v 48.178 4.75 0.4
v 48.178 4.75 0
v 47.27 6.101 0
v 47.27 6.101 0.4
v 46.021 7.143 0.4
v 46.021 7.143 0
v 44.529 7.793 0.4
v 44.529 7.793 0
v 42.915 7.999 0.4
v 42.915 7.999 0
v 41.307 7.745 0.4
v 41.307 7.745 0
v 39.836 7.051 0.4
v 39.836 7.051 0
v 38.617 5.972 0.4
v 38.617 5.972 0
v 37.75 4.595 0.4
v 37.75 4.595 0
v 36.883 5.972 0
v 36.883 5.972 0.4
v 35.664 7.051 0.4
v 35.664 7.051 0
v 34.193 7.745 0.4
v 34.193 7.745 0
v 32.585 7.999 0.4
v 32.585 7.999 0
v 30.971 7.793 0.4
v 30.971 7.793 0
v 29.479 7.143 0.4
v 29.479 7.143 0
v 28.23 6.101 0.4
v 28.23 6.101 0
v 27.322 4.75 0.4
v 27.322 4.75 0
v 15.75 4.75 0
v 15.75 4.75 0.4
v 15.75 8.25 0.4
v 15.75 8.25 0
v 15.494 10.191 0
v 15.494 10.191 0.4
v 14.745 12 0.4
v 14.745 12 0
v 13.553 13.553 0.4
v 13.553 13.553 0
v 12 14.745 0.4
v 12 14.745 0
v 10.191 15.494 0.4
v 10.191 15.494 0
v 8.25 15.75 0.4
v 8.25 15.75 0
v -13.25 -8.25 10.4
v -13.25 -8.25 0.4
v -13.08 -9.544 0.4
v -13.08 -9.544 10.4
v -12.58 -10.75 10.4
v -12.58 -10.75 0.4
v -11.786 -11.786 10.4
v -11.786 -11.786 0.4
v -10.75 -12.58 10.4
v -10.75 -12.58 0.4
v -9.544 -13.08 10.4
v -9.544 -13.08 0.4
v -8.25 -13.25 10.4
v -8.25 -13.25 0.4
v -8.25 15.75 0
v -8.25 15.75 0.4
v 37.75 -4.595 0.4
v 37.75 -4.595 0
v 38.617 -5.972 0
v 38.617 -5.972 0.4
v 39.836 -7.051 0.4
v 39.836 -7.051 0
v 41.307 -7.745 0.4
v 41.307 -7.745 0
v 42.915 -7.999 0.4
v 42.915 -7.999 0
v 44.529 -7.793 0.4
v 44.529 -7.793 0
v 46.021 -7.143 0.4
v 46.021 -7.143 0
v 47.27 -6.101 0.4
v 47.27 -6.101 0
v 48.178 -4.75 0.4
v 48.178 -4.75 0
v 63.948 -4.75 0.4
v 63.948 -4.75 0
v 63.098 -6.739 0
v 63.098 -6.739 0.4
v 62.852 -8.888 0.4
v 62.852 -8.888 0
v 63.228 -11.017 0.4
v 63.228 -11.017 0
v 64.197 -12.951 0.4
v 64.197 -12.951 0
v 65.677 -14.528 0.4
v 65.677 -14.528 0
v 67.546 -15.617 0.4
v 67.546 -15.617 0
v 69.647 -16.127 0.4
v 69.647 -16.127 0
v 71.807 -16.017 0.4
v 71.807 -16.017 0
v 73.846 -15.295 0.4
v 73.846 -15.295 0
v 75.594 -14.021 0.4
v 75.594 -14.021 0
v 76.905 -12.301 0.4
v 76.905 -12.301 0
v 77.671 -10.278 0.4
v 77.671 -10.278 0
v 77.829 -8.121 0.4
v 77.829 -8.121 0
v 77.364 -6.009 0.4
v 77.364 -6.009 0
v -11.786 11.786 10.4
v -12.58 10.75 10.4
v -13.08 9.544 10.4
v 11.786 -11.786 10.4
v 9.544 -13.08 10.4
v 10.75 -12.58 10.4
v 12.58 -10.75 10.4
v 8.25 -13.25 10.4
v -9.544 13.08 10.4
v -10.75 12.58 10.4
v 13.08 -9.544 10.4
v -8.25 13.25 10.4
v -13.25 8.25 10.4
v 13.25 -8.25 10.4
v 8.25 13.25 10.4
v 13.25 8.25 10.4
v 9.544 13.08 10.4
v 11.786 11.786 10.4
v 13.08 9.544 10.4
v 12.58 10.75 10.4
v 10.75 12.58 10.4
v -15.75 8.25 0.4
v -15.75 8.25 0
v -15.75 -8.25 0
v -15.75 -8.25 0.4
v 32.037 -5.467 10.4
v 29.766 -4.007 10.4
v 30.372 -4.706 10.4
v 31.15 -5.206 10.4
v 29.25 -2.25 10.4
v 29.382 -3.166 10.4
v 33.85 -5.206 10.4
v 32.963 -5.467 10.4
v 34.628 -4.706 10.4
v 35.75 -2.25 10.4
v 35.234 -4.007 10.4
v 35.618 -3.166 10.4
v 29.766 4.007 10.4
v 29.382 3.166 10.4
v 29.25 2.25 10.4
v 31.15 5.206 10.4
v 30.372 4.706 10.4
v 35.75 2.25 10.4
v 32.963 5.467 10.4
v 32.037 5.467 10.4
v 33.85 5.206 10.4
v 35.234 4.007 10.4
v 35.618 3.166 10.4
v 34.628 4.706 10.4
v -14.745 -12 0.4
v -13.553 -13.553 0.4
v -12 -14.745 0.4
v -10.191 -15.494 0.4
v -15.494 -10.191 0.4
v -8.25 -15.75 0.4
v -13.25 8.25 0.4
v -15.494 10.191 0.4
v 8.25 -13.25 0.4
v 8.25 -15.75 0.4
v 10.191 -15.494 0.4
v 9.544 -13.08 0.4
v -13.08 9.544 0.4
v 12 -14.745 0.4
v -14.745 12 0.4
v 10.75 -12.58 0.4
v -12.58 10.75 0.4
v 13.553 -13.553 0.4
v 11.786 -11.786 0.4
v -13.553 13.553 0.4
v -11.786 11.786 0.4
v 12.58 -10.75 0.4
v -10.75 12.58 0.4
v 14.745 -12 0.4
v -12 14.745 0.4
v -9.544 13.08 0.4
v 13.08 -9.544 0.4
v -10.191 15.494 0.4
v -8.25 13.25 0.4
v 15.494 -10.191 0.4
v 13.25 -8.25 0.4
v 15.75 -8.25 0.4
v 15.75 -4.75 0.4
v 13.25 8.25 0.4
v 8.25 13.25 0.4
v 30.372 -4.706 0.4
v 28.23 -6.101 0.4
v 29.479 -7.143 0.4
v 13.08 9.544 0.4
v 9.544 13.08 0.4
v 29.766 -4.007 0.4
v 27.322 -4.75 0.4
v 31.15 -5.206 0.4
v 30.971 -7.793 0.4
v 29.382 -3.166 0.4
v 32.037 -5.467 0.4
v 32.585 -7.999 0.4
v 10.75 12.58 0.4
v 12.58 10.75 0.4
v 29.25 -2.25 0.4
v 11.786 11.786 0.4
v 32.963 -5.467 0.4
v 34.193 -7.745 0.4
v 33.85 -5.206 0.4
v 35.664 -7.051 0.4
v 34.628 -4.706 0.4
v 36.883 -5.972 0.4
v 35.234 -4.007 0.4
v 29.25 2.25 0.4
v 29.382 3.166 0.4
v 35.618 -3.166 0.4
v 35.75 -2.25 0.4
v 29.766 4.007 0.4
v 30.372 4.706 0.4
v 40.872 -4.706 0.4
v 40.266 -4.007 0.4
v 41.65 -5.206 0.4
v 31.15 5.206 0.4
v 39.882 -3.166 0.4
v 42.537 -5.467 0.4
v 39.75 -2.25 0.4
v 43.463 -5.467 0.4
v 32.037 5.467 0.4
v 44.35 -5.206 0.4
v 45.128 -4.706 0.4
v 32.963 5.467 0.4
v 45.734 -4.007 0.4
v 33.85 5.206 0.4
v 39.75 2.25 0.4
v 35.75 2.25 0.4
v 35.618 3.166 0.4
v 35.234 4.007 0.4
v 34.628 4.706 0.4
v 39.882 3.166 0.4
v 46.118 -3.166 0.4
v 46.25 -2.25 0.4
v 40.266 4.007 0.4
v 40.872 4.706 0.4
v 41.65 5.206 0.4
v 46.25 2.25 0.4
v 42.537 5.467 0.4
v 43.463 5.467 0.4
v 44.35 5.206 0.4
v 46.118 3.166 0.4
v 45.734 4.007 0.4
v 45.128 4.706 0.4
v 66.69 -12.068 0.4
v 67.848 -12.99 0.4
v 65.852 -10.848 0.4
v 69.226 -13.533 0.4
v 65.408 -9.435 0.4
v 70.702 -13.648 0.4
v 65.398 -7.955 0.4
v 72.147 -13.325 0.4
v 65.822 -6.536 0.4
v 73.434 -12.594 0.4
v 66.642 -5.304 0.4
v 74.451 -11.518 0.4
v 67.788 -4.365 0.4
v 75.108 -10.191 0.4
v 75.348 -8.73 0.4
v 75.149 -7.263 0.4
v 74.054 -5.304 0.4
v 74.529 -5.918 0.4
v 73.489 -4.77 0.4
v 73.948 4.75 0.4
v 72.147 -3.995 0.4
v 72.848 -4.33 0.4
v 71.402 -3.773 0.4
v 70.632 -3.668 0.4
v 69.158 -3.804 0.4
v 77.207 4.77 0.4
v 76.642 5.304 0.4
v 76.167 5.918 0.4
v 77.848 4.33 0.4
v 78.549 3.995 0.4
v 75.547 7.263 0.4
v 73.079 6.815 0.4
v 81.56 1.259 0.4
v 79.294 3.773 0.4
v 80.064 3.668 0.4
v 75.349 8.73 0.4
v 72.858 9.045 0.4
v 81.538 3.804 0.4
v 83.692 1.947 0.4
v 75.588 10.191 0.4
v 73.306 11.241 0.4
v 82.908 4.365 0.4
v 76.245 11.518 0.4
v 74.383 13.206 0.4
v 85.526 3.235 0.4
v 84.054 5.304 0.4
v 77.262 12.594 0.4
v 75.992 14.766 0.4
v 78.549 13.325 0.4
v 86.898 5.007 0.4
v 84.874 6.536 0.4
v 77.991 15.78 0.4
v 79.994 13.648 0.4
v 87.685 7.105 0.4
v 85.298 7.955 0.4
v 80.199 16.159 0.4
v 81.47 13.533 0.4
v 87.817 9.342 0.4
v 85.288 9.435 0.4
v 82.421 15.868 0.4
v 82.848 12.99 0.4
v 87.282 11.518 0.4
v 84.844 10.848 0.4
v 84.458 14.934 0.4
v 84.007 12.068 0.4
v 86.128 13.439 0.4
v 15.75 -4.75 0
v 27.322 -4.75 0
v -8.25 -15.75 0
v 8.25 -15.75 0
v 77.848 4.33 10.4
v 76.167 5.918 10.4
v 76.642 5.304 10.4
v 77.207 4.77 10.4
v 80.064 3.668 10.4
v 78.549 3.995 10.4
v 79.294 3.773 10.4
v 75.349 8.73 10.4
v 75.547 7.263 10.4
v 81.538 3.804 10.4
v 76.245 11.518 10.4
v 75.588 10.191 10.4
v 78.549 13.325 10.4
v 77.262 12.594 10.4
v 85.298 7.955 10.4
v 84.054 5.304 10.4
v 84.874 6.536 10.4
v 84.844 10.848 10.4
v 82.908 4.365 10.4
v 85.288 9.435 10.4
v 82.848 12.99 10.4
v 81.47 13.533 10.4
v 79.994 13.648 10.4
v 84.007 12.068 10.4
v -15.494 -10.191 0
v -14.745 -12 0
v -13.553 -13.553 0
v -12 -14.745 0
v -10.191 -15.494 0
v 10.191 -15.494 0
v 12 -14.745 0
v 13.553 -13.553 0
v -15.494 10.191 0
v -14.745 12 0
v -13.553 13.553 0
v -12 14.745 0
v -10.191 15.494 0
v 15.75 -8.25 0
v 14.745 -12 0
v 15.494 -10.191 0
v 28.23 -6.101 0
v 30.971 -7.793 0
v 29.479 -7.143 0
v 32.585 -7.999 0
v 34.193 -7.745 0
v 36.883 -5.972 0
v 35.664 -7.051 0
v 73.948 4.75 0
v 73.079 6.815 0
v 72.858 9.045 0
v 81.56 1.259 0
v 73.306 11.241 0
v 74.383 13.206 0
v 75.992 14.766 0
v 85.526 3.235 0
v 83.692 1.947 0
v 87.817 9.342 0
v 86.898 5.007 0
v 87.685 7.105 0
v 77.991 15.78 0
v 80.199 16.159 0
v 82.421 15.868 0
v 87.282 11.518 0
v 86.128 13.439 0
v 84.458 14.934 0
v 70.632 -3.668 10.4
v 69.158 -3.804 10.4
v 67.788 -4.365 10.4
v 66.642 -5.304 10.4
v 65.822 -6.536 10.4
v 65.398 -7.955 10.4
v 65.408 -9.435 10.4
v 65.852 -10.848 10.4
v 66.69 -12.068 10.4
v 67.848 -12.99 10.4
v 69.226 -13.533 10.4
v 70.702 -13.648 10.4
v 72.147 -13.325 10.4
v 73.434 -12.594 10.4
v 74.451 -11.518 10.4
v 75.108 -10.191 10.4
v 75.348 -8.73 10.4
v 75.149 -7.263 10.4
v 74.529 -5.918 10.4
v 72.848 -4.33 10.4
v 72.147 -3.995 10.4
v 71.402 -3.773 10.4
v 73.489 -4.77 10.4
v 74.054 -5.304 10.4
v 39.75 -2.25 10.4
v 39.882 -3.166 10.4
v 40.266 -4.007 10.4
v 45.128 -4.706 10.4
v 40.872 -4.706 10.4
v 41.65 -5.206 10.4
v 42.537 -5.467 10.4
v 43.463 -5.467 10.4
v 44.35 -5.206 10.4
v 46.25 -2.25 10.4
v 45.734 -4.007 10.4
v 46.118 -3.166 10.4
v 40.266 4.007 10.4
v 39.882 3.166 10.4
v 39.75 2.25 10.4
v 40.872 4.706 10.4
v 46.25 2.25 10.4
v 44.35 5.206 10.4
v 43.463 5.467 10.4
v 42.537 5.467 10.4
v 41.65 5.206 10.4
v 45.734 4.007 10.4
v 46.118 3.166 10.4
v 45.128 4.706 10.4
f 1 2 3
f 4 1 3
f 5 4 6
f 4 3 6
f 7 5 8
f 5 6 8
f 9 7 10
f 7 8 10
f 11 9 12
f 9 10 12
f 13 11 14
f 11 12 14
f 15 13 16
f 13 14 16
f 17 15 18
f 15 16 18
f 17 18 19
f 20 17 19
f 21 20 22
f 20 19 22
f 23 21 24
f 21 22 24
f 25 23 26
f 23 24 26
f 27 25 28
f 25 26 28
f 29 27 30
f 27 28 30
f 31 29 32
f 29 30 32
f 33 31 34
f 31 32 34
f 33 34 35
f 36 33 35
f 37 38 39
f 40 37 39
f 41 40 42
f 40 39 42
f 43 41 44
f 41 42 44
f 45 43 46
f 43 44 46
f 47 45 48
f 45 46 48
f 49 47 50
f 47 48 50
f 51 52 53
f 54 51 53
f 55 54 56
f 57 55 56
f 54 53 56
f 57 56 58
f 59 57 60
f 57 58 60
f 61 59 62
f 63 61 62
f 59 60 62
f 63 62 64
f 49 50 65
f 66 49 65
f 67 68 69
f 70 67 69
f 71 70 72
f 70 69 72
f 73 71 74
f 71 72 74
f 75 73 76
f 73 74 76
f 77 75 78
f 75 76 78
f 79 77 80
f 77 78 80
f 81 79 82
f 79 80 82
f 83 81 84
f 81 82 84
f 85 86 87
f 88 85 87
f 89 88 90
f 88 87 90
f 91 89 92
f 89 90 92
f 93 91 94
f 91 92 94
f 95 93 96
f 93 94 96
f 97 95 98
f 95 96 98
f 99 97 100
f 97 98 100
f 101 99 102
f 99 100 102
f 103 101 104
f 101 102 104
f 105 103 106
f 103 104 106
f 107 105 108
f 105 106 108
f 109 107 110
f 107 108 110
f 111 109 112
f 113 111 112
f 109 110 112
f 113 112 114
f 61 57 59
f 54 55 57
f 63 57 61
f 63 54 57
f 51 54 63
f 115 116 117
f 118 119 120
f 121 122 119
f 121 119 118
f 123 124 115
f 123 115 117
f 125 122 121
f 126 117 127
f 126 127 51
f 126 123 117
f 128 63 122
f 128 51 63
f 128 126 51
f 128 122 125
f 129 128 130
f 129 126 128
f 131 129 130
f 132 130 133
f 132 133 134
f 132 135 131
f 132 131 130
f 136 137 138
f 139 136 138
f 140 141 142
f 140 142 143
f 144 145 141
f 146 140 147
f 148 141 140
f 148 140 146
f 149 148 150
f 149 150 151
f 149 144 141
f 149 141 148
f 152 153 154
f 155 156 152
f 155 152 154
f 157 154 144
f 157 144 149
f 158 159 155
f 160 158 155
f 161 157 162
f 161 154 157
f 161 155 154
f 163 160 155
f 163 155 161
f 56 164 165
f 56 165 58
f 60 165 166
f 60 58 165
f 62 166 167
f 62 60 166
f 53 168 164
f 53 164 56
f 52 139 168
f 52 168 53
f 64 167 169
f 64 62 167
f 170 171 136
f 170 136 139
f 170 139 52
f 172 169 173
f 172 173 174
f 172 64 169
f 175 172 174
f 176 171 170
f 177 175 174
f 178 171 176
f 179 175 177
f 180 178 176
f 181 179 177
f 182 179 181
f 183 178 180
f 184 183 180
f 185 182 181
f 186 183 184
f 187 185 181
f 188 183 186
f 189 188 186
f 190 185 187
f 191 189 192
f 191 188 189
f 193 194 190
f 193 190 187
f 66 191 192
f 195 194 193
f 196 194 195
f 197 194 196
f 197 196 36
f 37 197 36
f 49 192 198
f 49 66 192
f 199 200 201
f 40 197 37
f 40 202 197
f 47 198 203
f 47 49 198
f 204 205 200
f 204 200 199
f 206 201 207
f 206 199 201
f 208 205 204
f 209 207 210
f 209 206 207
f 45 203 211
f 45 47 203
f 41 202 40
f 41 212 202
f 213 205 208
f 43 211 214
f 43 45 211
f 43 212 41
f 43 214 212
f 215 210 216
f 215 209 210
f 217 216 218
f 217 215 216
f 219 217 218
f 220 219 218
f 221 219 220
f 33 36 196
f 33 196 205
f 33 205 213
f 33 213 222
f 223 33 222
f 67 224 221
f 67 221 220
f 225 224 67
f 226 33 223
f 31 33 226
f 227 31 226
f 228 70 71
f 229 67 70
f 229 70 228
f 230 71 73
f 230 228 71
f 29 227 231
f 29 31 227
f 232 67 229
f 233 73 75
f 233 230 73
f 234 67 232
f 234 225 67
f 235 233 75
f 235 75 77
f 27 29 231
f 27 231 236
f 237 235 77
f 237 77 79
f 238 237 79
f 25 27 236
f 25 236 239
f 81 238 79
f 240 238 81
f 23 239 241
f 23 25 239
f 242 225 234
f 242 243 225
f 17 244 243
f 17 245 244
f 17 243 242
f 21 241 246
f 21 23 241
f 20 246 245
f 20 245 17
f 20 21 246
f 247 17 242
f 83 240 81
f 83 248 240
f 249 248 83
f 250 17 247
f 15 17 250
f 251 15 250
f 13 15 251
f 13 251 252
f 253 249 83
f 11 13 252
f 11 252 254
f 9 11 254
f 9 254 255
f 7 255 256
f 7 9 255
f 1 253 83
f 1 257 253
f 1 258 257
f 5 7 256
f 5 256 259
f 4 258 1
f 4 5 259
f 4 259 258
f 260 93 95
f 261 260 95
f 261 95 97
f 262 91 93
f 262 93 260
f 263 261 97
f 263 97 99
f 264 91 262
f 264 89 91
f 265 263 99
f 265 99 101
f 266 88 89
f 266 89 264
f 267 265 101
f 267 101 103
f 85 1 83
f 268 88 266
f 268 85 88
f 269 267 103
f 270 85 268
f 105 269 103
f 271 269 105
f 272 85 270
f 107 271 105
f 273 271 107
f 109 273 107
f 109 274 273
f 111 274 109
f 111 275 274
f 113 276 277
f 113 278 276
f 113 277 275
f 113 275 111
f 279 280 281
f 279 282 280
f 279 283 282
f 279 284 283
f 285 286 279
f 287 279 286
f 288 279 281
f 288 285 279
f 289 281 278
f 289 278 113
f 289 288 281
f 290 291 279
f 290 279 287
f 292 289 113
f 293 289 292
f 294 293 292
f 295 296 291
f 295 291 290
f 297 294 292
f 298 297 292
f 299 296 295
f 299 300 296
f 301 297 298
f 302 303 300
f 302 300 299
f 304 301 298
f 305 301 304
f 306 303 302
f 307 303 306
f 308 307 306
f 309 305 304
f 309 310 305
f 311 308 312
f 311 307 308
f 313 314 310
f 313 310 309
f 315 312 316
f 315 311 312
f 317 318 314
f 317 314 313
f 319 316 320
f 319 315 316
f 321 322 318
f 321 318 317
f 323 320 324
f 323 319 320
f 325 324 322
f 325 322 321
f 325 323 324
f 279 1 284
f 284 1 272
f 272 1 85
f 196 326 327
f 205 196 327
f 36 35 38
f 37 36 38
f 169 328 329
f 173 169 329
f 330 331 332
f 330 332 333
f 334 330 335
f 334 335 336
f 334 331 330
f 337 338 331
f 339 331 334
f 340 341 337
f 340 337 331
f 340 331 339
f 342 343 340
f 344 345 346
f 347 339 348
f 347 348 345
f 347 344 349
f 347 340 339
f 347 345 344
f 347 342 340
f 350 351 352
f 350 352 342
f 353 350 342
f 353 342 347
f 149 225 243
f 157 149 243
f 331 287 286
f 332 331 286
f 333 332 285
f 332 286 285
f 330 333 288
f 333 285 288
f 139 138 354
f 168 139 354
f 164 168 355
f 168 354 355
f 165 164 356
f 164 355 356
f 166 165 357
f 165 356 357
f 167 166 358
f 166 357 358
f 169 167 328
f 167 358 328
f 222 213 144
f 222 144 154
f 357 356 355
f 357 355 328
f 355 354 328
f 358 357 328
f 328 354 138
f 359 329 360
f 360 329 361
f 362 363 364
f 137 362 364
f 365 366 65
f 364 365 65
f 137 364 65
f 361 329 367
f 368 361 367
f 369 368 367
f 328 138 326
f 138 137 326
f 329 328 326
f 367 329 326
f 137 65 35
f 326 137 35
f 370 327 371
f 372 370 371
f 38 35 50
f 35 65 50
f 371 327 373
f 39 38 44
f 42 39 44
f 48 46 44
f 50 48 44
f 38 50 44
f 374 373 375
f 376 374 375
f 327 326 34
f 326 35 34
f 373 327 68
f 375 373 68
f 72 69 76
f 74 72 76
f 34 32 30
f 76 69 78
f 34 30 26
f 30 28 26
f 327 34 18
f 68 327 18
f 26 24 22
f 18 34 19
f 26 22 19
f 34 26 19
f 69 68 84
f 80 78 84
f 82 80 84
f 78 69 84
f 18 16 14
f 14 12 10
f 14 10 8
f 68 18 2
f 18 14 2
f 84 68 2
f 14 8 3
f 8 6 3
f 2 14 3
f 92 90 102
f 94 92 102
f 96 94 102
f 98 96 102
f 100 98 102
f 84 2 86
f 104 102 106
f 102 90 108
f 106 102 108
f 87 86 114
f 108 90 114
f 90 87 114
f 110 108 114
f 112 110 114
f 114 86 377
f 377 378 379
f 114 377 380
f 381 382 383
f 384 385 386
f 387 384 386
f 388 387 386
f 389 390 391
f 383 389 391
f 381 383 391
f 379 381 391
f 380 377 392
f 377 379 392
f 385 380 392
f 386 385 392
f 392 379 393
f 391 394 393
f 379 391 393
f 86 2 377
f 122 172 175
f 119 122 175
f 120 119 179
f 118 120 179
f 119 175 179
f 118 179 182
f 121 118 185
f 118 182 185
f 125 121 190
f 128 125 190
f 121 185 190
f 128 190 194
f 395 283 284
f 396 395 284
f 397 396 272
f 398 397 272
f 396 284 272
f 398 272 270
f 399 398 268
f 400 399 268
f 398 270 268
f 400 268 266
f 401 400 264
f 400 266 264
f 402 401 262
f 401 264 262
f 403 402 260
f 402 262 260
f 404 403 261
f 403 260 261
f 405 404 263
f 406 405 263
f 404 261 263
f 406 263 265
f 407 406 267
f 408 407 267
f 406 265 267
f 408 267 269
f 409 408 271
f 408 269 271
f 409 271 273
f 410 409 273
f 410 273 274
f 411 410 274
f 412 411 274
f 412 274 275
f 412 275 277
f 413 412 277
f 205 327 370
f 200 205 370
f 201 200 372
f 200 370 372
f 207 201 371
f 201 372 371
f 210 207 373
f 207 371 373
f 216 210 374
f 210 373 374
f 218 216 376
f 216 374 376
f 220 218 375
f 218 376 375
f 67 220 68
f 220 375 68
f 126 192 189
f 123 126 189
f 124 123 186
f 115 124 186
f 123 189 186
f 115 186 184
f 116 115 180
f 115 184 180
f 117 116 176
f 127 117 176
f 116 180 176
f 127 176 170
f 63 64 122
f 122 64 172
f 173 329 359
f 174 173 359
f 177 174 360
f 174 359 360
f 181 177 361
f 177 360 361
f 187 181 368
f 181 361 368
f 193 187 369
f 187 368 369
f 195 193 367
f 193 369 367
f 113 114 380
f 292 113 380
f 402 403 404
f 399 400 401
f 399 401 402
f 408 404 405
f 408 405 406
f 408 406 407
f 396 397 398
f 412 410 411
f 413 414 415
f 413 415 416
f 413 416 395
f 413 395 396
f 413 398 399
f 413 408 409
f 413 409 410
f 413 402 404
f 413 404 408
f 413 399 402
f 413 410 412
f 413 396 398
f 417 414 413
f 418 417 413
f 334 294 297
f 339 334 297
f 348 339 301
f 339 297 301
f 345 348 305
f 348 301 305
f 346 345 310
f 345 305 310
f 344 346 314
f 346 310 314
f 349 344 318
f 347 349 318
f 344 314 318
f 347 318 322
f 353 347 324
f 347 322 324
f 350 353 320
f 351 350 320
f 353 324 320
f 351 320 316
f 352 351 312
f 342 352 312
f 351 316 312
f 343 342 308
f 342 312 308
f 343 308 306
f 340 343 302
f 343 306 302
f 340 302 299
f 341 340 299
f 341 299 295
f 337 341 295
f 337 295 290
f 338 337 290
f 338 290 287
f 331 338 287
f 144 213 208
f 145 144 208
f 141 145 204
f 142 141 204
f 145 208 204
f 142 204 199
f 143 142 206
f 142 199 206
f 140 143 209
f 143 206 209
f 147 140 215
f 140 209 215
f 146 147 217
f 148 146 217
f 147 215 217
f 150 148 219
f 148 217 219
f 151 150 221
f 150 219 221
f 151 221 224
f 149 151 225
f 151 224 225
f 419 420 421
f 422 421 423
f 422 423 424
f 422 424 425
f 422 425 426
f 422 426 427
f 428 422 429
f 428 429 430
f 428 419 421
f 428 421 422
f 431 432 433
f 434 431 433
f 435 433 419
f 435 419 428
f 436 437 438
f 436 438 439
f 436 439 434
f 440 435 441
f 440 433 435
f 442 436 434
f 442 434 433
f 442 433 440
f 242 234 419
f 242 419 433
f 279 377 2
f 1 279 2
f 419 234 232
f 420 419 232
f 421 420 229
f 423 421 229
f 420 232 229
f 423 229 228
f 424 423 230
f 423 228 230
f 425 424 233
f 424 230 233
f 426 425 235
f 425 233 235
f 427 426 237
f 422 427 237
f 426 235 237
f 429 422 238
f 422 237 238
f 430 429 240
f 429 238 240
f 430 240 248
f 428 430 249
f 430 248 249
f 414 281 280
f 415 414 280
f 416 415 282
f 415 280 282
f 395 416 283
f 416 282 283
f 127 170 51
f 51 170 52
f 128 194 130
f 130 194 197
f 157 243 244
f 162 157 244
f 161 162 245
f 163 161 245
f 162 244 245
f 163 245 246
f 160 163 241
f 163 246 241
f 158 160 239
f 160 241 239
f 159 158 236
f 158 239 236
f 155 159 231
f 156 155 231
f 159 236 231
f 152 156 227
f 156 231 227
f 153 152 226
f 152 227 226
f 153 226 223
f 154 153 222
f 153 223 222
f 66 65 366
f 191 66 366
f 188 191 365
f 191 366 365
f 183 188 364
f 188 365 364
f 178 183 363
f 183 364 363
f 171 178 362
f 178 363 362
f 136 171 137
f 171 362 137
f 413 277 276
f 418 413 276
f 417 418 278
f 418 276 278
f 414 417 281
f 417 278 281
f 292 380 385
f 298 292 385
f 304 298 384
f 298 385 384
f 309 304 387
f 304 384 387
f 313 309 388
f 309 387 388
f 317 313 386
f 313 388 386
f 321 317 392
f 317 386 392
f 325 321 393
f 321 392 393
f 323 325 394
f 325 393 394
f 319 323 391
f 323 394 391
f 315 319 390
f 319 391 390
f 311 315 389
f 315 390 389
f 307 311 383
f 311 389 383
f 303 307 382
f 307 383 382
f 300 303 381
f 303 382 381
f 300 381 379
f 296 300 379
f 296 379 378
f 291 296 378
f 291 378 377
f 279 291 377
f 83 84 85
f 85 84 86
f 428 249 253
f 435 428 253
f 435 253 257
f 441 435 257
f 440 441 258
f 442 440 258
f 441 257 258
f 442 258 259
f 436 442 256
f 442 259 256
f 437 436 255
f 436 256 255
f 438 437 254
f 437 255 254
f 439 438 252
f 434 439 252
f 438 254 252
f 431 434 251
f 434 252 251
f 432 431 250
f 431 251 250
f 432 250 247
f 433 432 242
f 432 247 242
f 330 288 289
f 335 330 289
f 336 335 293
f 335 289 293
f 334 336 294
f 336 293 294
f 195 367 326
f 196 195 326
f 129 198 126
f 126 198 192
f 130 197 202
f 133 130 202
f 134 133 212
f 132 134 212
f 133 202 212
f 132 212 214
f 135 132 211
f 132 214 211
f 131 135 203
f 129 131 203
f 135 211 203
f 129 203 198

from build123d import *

# Parameters (mm, degrees)
F0_W     = 4
F0_H     = 4.5
F0_W_2   = 16
F0_W_3   = 6.5
F1_DEPTH = 0.4
F2_W     = 6.5
F2_H     = 4.5
F3_DEPTH = 10


with BuildPart() as f1:
    # F0 (on Top) → F1 (new body)
    with BuildSketch(Plane.XY):
        with BuildLine():
            Line((15.75, 4.75), (15.75, 8.25))
            ThreePointArc((15.75, 8.25), (13.5533008589, 13.5533008589), (8.25, 15.75))
            Line((8.25, 15.75), (-8.25, 15.75))
            ThreePointArc((-8.25, 15.75), (-13.5533008589, 13.5533008589), (-15.75, 8.25))
            Line((-15.75, 8.25), (-15.75, -8.25))
            ThreePointArc((-15.75, -8.25), (-13.5533008589, -13.5533008589), (-8.25, -15.75))
            Line((-8.25, -15.75), (8.25, -15.75))
            ThreePointArc((8.25, -15.75), (13.5533008589, -13.5533008589), (15.75, -8.25))
            Line((15.75, -8.25), (15.75, -4.75))
            Line((15.75, -4.75), (27.3219212057, -4.75))
            ThreePointArc((27.3219212057, -4.75), (32.5853423404, -7.9993666334), (37.75, -4.5952078799))
            ThreePointArc((37.75, -4.5952078799), (42.9146576596, -7.9993666334), (48.1780787943, -4.75))
            Line((48.1780787943, -4.75), (63.9480829801, -4.75))
            ThreePointArc((63.9480829801, -4.75), (69.6474451199, -16.1274567319), (77.3637435709, -6.0087617221))
            Line((77.3637435709, -6.0087617221), (81.5596501878, 1.2587617221))
            ThreePointArc((81.5596501878, 1.2587617221), (83.4749132345, 15.4773568118), (73.9480829801, 4.75))
            Line((73.9480829801, 4.75), (48.1780787943, 4.75))
            ThreePointArc((48.1780787943, 4.75), (42.9146576596, 7.9993666334), (37.75, 4.5952078799))
            ThreePointArc((37.75, 4.5952078799), (32.5853423404, 7.9993666334), (27.3219212057, 4.75))
            Line((27.3219212057, 4.75), (15.75, 4.75))
        make_face()
        with BuildLine():
            Line((4.5, 13.25), (8.25, 13.25))
            ThreePointArc((8.25, 13.25), (11.7855339059, 11.7855339059), (13.25, 8.25))
            Line((13.25, 8.25), (13.25, 4.5))
            Line((13.25, 4.5), (13.25, 2.25))
            Line((13.25, 2.25), (29.25, 2.25))
            ThreePointArc((29.25, 2.25), (32.5, 5.5), (35.75, 2.25))
            Line((35.75, 2.25), (39.75, 2.25))
            ThreePointArc((39.75, 2.25), (43, 5.5), (46.25, 2.25))
            Line((46.25, 2.25), (74.0490381057, 2.25))
            Line((74.0490381057, 2.25), (76.1669476654, 5.9183269633))
            ThreePointArc((76.1669476654, 5.9183269633), (82.8480762114, 12.9903810568), (80.0640619824, 3.6683269633))
            Line((80.0640619824, 3.6683269633), (74.5292047573, -5.9183269633))
            ThreePointArc((74.5292047573, -5.9183269633), (67.8480762114, -12.9903810568), (70.6320904403, -3.6683269633))
            Line((70.6320904403, -3.6683269633), (71.4509618943, -2.25))
            Line((71.4509618943, -2.25), (46.25, -2.25))
            ThreePointArc((46.25, -2.25), (43, -5.5), (39.75, -2.25))
            Line((39.75, -2.25), (35.75, -2.25))
            ThreePointArc((35.75, -2.25), (32.5, -5.5), (29.25, -2.25))
            Line((29.25, -2.25), (13.25, -2.25))
            Line((13.25, -2.25), (13.25, -4.5))
            Line((13.25, -4.5), (13.25, -8.25))
            ThreePointArc((13.25, -8.25), (11.7855339059, -11.7855339059), (8.25, -13.25))
            Line((8.25, -13.25), (4.5, -13.25))
            Line((4.5, -13.25), (-4.5, -13.25))
            Line((-4.5, -13.25), (-8.25, -13.25))
            ThreePointArc((-8.25, -13.25), (-11.7855339059, -11.7855339059), (-13.25, -8.25))
            Line((-13.25, -8.25), (-13.25, -4.5))
            Line((-13.25, -4.5), (-13.25, 4.5))
            Line((-13.25, 4.5), (-13.25, 8.25))
            ThreePointArc((-13.25, 8.25), (-11.7855339059, 11.7855339059), (-8.25, 13.25))
            Line((-8.25, 13.25), (-4.5, 13.25))
            Line((-4.5, 13.25), (4.5, 13.25))
        make_face(mode=Mode.SUBTRACT)
        with Locations((37.75, 0)):
            Rectangle(F0_W, F0_H)
        with BuildLine():
            Line((4.5, 0), (4.5, 4.5))
            Line((4.5, 4.5), (0, 4.5))
            ThreePointArc((0, 4.5), (3.1819805153, 3.1819805153), (4.5, 0))
        make_face()
        with Locations((21.25, 0)):
            Rectangle(F0_W_2, F0_H)
        Polygon((74.0490381057, 2.25), (46.25, 2.25), (46.25, -2.25), (71.4509618943, -2.25), align=None)
        with BuildLine():
            ThreePointArc((13.25, 8.25), (11.7855339059, 11.7855339059), (8.25, 13.25))
            Line((8.25, 13.25), (4.5, 13.25))
            Line((4.5, 13.25), (4.5, 4.5))
            Line((4.5, 4.5), (13.25, 4.5))
            Line((13.25, 4.5), (13.25, 8.25))
        make_face()
        Polygon((4.5, 4.5), (4.5, 13.25), (-4.5, 13.25), (-4.5, 4.5), (0, 4.5), align=None)
        with BuildLine():
            Line((0, 4.5), (-4.5, 4.5))
            Line((-4.5, 4.5), (-4.5, 0))
            ThreePointArc((-4.5, 0), (-3.1819805153, 3.1819805153), (0, 4.5))
        make_face()
        with BuildLine():
            Line((-4.5, 4.5), (-4.5, 13.25))
            Line((-4.5, 13.25), (-8.25, 13.25))
            ThreePointArc((-8.25, 13.25), (-11.7855339059, 11.7855339059), (-13.25, 8.25))
            Line((-13.25, 8.25), (-13.25, 4.5))
            Line((-13.25, 4.5), (-4.5, 4.5))
        make_face()
        with BuildLine():
            ThreePointArc((0, -4.5), (-3.1819805153, -3.1819805153), (-4.5, 0))
            Line((-4.5, 0), (-4.5, -4.5))
            Line((-4.5, -4.5), (0, -4.5))
        make_face()
        Polygon((-4.5, 0), (-4.5, 4.5), (-13.25, 4.5), (-13.25, -4.5), (-4.5, -4.5), align=None)
        with BuildLine():
            Line((76.1669476654, 5.9183269633), (74.0490381057, 2.25))
            Line((74.0490381057, 2.25), (71.4509618943, -2.25))
            Line((71.4509618943, -2.25), (70.6320904403, -3.6683269633))
            ThreePointArc((70.6320904403, -3.6683269633), (72.8480762114, -4.3301270189), (74.5292047573, -5.9183269633))
            Line((74.5292047573, -5.9183269633), (80.0640619824, 3.6683269633))
            ThreePointArc((80.0640619824, 3.6683269633), (77.8480762114, 4.3301270189), (76.1669476654, 5.9183269633))
        make_face()
        with BuildLine():
            Line((13.25, -4.5), (4.5, -4.5))
            Line((4.5, -4.5), (4.5, -13.25))
            Line((4.5, -13.25), (8.25, -13.25))
            ThreePointArc((8.25, -13.25), (11.7855339059, -11.7855339059), (13.25, -8.25))
            Line((13.25, -8.25), (13.25, -4.5))
        make_face()
        Polygon((4.5, -4.5), (0, -4.5), (-4.5, -4.5), (-4.5, -13.25), (4.5, -13.25), align=None)
        with BuildLine():
            Line((-4.5, -13.25), (-4.5, -4.5))
            Line((-4.5, -4.5), (-13.25, -4.5))
            Line((-13.25, -4.5), (-13.25, -8.25))
            ThreePointArc((-13.25, -8.25), (-11.7855339059, -11.7855339059), (-8.25, -13.25))
            Line((-8.25, -13.25), (-4.5, -13.25))
        make_face()
        with BuildLine():
            ThreePointArc((0, -4.5), (3.1819805153, -3.1819805153), (4.5, 0))
            ThreePointArc((4.5, 0), (3.1819805153, 3.1819805153), (0, 4.5))
            ThreePointArc((0, 4.5), (-3.1819805153, 3.1819805153), (-4.5, 0))
            ThreePointArc((-4.5, 0), (-3.1819805153, -3.1819805153), (0, -4.5))
        make_face()
        with BuildLine():
            ThreePointArc((35.75, 2.25), (32.5, 5.5), (29.25, 2.25))
            Line((29.25, 2.25), (35.75, 2.25))
        make_face()
        with BuildLine():
            Line((4.5, -4.5), (4.5, 0))
            ThreePointArc((4.5, 0), (3.1819805153, -3.1819805153), (0, -4.5))
            Line((0, -4.5), (4.5, -4.5))
        make_face()
        with BuildLine():
            Line((46.25, -2.25), (39.75, -2.25))
            ThreePointArc((39.75, -2.25), (43, -5.5), (46.25, -2.25))
        make_face()
        with BuildLine():
            ThreePointArc((46.25, 2.25), (43, 5.5), (39.75, 2.25))
            Line((39.75, 2.25), (46.25, 2.25))
        make_face()
        with BuildLine():
            Line((35.75, -2.25), (29.25, -2.25))
            ThreePointArc((29.25, -2.25), (32.5, -5.5), (35.75, -2.25))
        make_face()
        with BuildLine():
            ThreePointArc((74.5292047573, -5.9183269633), (72.8480762114, -4.3301270189), (70.6320904403, -3.6683269633))
            ThreePointArc((70.6320904403, -3.6683269633), (67.8480762114, -12.9903810568), (74.5292047573, -5.9183269633))
        make_face()
        with BuildLine():
            ThreePointArc((80.0640619824, 3.6683269633), (82.8480762114, 12.9903810568), (76.1669476654, 5.9183269633))
            ThreePointArc((76.1669476654, 5.9183269633), (77.8480762114, 4.3301270189), (80.0640619824, 3.6683269633))
        make_face()
        Polygon((13.25, 4.5), (4.5, 4.5), (4.5, 0), (4.5, -4.5), (13.25, -4.5), (13.25, -2.25), (13.25, 2.25), align=None)
        with Locations((32.5, 0)):
            Rectangle(F0_W_3, F0_H)
        with Locations((43, 0)):
            Rectangle(F0_W_3, F0_H)
    extrude(amount=F1_DEPTH)

    # F2 (on face) → F3 (join)
    with BuildSketch(Plane.XY.offset(0.4)):
        with BuildLine():
            Line((4.5, -4.5), (4.5, 0))
            ThreePointArc((4.5, 0), (3.1819805153, -3.1819805153), (0, -4.5))
            Line((0, -4.5), (4.5, -4.5))
        make_face()
        with BuildLine():
            ThreePointArc((0, -4.5), (3.1819805153, -3.1819805153), (4.5, 0))
            ThreePointArc((4.5, 0), (3.1819805153, 3.1819805153), (0, 4.5))
            ThreePointArc((0, 4.5), (-3.1819805153, 3.1819805153), (-4.5, 0))
            ThreePointArc((-4.5, 0), (-3.1819805153, -3.1819805153), (0, -4.5))
        make_face()
        with BuildLine():
            Line((4.5, 0), (4.5, 4.5))
            Line((4.5, 4.5), (0, 4.5))
            ThreePointArc((0, 4.5), (3.1819805153, 3.1819805153), (4.5, 0))
        make_face()
        with BuildLine():
            Line((0, 4.5), (-4.5, 4.5))
            Line((-4.5, 4.5), (-4.5, 0))
            ThreePointArc((-4.5, 0), (-3.1819805153, 3.1819805153), (0, 4.5))
        make_face()
        with BuildLine():
            ThreePointArc((0, -4.5), (-3.1819805153, -3.1819805153), (-4.5, 0))
            Line((-4.5, 0), (-4.5, -4.5))
            Line((-4.5, -4.5), (0, -4.5))
        make_face()
        Polygon((13.25, 4.5), (4.5, 4.5), (4.5, 0), (4.5, -4.5), (13.25, -4.5), (13.25, -2.25), (13.25, 2.25), align=None)
        with BuildLine():
            Line((-4.5, 4.5), (-4.5, 13.25))
            Line((-4.5, 13.25), (-8.25, 13.25))
            ThreePointArc((-8.25, 13.25), (-11.7855339059, 11.7855339059), (-13.25, 8.25))
            Line((-13.25, 8.25), (-13.25, 4.5))
            Line((-13.25, 4.5), (-4.5, 4.5))
        make_face()
        Polygon((-4.5, 0), (-4.5, 4.5), (-13.25, 4.5), (-13.25, -4.5), (-4.5, -4.5), align=None)
        with BuildLine():
            ThreePointArc((13.25, 8.25), (11.7855339059, 11.7855339059), (8.25, 13.25))
            Line((8.25, 13.25), (4.5, 13.25))
            Line((4.5, 13.25), (4.5, 4.5))
            Line((4.5, 4.5), (13.25, 4.5))
            Line((13.25, 4.5), (13.25, 8.25))
        make_face()
        Polygon((4.5, 4.5), (4.5, 13.25), (-4.5, 13.25), (-4.5, 4.5), (0, 4.5), align=None)
        Polygon((4.5, -4.5), (0, -4.5), (-4.5, -4.5), (-4.5, -13.25), (4.5, -13.25), align=None)
        with BuildLine():
            Line((-4.5, -13.25), (-4.5, -4.5))
            Line((-4.5, -4.5), (-13.25, -4.5))
            Line((-13.25, -4.5), (-13.25, -8.25))
            ThreePointArc((-13.25, -8.25), (-11.7855339059, -11.7855339059), (-8.25, -13.25))
            Line((-8.25, -13.25), (-4.5, -13.25))
        make_face()
        with BuildLine():
            Line((13.25, -4.5), (4.5, -4.5))
            Line((4.5, -4.5), (4.5, -13.25))
            Line((4.5, -13.25), (8.25, -13.25))
            ThreePointArc((8.25, -13.25), (11.7855339059, -11.7855339059), (13.25, -8.25))
            Line((13.25, -8.25), (13.25, -4.5))
        make_face()
        with Locations((32.5, 0)):
            Rectangle(F2_W, F2_H)
        with BuildLine():
            ThreePointArc((35.75, 2.25), (32.5, 5.5), (29.25, 2.25))
            Line((29.25, 2.25), (35.75, 2.25))
        make_face()
        with BuildLine():
            Line((35.75, -2.25), (29.25, -2.25))
            ThreePointArc((29.25, -2.25), (32.5, -5.5), (35.75, -2.25))
        make_face()
        with BuildLine():
            Line((46.25, -2.25), (39.75, -2.25))
            ThreePointArc((39.75, -2.25), (43, -5.5), (46.25, -2.25))
        make_face()
        with Locations((43, 0)):
            Rectangle(F2_W, F2_H)
        with BuildLine():
            ThreePointArc((46.25, 2.25), (43, 5.5), (39.75, 2.25))
            Line((39.75, 2.25), (46.25, 2.25))
        make_face()
        with BuildLine():
            ThreePointArc((72.8480762114, -4.3301270189), (71.7788727151, -3.8693437522), (70.6320904403, -3.6683269633))
            ThreePointArc((70.6320904403, -3.6683269633), (67.8480762114, -12.9903810568), (74.5292047573, -5.9183269633))
            ThreePointArc((74.5292047573, -5.9183269633), (73.7817279741, -5.0256927751), (72.8480762114, -4.3301270189))
        make_face()
        with BuildLine():
            ThreePointArc((80.0640619824, 3.6683269633), (82.8480762114, 12.9903810568), (76.1669476654, 5.9183269633))
            ThreePointArc((76.1669476654, 5.9183269633), (76.9144244486, 5.0256927751), (77.8480762114, 4.3301270189))
            ThreePointArc((77.8480762114, 4.3301270189), (78.9172797076, 3.8693437522), (80.0640619824, 3.6683269633))
        make_face()
    extrude(amount=F3_DEPTH)


solid = f1.part
